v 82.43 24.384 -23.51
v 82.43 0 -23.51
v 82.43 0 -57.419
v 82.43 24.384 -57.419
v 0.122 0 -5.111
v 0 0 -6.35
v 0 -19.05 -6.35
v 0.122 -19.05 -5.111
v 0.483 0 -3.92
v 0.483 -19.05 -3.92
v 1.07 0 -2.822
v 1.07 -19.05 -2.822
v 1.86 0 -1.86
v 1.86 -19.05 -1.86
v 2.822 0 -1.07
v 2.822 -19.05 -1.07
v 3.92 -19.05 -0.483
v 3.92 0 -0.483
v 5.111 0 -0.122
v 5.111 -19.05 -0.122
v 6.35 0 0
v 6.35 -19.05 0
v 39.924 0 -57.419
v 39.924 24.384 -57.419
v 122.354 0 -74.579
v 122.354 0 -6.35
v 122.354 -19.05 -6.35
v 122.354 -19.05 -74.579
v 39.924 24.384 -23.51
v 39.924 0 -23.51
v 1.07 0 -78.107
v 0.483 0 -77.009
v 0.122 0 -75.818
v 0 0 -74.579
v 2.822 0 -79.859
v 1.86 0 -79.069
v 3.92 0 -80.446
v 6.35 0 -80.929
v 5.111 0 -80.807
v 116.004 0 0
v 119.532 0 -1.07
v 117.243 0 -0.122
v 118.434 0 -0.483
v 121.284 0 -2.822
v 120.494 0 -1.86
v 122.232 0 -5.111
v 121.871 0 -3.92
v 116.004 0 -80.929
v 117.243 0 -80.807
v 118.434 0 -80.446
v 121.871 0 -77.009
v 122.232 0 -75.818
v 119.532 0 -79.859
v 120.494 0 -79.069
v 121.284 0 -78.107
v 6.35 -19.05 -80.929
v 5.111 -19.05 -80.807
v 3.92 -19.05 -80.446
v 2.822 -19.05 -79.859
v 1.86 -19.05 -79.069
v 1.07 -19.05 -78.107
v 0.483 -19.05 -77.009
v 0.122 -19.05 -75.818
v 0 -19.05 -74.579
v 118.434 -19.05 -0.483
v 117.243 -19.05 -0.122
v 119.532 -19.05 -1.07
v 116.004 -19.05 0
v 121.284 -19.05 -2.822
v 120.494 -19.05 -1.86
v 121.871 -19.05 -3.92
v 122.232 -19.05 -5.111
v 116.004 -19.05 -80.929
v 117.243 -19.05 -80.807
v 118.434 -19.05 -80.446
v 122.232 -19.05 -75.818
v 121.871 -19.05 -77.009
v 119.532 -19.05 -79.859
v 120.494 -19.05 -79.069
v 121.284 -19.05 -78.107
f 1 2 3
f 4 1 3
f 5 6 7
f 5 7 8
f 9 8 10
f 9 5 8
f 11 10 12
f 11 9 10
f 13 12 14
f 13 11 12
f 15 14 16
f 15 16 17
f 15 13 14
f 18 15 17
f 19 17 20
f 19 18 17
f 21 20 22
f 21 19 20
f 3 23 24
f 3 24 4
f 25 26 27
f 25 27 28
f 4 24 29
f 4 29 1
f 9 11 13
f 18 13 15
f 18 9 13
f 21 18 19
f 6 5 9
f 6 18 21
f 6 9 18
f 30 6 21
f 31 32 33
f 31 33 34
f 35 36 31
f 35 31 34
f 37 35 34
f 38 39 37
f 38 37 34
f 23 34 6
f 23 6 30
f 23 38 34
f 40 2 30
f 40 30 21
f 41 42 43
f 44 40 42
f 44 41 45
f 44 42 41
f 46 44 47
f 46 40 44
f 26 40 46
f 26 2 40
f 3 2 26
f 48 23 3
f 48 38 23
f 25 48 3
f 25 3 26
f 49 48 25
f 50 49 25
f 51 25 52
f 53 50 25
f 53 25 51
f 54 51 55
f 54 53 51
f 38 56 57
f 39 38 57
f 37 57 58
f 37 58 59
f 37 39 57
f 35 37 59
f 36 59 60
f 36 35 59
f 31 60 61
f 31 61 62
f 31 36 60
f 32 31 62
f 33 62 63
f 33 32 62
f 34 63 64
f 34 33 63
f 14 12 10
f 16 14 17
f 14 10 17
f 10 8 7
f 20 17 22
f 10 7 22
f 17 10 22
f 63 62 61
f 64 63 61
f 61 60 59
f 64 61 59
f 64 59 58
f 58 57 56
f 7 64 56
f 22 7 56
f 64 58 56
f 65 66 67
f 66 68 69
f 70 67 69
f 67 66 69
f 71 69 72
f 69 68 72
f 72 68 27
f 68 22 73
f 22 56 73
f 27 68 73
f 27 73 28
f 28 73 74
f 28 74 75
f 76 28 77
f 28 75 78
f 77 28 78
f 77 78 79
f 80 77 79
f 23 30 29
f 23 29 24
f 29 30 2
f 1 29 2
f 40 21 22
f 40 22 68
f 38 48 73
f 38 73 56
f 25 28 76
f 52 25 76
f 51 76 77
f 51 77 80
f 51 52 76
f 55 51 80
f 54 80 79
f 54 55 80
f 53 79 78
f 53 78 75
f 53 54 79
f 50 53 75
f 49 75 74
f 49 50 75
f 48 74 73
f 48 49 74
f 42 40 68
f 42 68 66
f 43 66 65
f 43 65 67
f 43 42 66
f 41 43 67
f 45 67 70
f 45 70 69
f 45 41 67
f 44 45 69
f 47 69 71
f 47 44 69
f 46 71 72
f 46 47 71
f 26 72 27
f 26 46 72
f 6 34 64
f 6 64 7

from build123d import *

# Parameters (mm, degrees)
EXTRUDE4_DEPTH = 19.05
SKETCH4_W      = 42.505133665
SKETCH4_H      = 33.908575234
EXTRUDE5_DEPTH = 24.384


with BuildPart() as part:
    # Sketch3 → Extrude4 (new body)
    with BuildSketch(Plane(origin=(0, 0, 0), x_dir=(1, 0, 0), z_dir=(0, 1, 0))):
        with BuildLine():
            Line((6.35, 0), (116.003921001, 0))
            ThreePointArc((116.003921001, 0), (120.494049062, 1.859871939), (122.353921001, 6.35))
            Line((122.353921001, 6.35), (122.353921001, 74.579258312))
            ThreePointArc((122.353921001, 74.579258312), (120.494049062, 79.069386372), (116.003921001, 80.929258312))
            Line((116.003921001, 80.929258312), (6.35, 80.929258312))
            ThreePointArc((6.35, 80.929258312), (1.859871939, 79.069386372), (0, 74.579258312))
            Line((0, 74.579258312), (0, 6.35))
            ThreePointArc((0, 6.35), (1.859871939, 1.859871939), (6.35, 0))
        make_face()
    extrude(amount=-EXTRUDE4_DEPTH)

    # Sketch4 → Extrude5 (add)
    with BuildSketch(Plane(origin=(0, 0, 0), x_dir=(1, 0, 0), z_dir=(0, 1, 0))):
        with Locations((61.176960501, 40.464629156)):
            Rectangle(SKETCH4_W, SKETCH4_H)
    extrude(amount=EXTRUDE5_DEPTH)


solid = part.part
